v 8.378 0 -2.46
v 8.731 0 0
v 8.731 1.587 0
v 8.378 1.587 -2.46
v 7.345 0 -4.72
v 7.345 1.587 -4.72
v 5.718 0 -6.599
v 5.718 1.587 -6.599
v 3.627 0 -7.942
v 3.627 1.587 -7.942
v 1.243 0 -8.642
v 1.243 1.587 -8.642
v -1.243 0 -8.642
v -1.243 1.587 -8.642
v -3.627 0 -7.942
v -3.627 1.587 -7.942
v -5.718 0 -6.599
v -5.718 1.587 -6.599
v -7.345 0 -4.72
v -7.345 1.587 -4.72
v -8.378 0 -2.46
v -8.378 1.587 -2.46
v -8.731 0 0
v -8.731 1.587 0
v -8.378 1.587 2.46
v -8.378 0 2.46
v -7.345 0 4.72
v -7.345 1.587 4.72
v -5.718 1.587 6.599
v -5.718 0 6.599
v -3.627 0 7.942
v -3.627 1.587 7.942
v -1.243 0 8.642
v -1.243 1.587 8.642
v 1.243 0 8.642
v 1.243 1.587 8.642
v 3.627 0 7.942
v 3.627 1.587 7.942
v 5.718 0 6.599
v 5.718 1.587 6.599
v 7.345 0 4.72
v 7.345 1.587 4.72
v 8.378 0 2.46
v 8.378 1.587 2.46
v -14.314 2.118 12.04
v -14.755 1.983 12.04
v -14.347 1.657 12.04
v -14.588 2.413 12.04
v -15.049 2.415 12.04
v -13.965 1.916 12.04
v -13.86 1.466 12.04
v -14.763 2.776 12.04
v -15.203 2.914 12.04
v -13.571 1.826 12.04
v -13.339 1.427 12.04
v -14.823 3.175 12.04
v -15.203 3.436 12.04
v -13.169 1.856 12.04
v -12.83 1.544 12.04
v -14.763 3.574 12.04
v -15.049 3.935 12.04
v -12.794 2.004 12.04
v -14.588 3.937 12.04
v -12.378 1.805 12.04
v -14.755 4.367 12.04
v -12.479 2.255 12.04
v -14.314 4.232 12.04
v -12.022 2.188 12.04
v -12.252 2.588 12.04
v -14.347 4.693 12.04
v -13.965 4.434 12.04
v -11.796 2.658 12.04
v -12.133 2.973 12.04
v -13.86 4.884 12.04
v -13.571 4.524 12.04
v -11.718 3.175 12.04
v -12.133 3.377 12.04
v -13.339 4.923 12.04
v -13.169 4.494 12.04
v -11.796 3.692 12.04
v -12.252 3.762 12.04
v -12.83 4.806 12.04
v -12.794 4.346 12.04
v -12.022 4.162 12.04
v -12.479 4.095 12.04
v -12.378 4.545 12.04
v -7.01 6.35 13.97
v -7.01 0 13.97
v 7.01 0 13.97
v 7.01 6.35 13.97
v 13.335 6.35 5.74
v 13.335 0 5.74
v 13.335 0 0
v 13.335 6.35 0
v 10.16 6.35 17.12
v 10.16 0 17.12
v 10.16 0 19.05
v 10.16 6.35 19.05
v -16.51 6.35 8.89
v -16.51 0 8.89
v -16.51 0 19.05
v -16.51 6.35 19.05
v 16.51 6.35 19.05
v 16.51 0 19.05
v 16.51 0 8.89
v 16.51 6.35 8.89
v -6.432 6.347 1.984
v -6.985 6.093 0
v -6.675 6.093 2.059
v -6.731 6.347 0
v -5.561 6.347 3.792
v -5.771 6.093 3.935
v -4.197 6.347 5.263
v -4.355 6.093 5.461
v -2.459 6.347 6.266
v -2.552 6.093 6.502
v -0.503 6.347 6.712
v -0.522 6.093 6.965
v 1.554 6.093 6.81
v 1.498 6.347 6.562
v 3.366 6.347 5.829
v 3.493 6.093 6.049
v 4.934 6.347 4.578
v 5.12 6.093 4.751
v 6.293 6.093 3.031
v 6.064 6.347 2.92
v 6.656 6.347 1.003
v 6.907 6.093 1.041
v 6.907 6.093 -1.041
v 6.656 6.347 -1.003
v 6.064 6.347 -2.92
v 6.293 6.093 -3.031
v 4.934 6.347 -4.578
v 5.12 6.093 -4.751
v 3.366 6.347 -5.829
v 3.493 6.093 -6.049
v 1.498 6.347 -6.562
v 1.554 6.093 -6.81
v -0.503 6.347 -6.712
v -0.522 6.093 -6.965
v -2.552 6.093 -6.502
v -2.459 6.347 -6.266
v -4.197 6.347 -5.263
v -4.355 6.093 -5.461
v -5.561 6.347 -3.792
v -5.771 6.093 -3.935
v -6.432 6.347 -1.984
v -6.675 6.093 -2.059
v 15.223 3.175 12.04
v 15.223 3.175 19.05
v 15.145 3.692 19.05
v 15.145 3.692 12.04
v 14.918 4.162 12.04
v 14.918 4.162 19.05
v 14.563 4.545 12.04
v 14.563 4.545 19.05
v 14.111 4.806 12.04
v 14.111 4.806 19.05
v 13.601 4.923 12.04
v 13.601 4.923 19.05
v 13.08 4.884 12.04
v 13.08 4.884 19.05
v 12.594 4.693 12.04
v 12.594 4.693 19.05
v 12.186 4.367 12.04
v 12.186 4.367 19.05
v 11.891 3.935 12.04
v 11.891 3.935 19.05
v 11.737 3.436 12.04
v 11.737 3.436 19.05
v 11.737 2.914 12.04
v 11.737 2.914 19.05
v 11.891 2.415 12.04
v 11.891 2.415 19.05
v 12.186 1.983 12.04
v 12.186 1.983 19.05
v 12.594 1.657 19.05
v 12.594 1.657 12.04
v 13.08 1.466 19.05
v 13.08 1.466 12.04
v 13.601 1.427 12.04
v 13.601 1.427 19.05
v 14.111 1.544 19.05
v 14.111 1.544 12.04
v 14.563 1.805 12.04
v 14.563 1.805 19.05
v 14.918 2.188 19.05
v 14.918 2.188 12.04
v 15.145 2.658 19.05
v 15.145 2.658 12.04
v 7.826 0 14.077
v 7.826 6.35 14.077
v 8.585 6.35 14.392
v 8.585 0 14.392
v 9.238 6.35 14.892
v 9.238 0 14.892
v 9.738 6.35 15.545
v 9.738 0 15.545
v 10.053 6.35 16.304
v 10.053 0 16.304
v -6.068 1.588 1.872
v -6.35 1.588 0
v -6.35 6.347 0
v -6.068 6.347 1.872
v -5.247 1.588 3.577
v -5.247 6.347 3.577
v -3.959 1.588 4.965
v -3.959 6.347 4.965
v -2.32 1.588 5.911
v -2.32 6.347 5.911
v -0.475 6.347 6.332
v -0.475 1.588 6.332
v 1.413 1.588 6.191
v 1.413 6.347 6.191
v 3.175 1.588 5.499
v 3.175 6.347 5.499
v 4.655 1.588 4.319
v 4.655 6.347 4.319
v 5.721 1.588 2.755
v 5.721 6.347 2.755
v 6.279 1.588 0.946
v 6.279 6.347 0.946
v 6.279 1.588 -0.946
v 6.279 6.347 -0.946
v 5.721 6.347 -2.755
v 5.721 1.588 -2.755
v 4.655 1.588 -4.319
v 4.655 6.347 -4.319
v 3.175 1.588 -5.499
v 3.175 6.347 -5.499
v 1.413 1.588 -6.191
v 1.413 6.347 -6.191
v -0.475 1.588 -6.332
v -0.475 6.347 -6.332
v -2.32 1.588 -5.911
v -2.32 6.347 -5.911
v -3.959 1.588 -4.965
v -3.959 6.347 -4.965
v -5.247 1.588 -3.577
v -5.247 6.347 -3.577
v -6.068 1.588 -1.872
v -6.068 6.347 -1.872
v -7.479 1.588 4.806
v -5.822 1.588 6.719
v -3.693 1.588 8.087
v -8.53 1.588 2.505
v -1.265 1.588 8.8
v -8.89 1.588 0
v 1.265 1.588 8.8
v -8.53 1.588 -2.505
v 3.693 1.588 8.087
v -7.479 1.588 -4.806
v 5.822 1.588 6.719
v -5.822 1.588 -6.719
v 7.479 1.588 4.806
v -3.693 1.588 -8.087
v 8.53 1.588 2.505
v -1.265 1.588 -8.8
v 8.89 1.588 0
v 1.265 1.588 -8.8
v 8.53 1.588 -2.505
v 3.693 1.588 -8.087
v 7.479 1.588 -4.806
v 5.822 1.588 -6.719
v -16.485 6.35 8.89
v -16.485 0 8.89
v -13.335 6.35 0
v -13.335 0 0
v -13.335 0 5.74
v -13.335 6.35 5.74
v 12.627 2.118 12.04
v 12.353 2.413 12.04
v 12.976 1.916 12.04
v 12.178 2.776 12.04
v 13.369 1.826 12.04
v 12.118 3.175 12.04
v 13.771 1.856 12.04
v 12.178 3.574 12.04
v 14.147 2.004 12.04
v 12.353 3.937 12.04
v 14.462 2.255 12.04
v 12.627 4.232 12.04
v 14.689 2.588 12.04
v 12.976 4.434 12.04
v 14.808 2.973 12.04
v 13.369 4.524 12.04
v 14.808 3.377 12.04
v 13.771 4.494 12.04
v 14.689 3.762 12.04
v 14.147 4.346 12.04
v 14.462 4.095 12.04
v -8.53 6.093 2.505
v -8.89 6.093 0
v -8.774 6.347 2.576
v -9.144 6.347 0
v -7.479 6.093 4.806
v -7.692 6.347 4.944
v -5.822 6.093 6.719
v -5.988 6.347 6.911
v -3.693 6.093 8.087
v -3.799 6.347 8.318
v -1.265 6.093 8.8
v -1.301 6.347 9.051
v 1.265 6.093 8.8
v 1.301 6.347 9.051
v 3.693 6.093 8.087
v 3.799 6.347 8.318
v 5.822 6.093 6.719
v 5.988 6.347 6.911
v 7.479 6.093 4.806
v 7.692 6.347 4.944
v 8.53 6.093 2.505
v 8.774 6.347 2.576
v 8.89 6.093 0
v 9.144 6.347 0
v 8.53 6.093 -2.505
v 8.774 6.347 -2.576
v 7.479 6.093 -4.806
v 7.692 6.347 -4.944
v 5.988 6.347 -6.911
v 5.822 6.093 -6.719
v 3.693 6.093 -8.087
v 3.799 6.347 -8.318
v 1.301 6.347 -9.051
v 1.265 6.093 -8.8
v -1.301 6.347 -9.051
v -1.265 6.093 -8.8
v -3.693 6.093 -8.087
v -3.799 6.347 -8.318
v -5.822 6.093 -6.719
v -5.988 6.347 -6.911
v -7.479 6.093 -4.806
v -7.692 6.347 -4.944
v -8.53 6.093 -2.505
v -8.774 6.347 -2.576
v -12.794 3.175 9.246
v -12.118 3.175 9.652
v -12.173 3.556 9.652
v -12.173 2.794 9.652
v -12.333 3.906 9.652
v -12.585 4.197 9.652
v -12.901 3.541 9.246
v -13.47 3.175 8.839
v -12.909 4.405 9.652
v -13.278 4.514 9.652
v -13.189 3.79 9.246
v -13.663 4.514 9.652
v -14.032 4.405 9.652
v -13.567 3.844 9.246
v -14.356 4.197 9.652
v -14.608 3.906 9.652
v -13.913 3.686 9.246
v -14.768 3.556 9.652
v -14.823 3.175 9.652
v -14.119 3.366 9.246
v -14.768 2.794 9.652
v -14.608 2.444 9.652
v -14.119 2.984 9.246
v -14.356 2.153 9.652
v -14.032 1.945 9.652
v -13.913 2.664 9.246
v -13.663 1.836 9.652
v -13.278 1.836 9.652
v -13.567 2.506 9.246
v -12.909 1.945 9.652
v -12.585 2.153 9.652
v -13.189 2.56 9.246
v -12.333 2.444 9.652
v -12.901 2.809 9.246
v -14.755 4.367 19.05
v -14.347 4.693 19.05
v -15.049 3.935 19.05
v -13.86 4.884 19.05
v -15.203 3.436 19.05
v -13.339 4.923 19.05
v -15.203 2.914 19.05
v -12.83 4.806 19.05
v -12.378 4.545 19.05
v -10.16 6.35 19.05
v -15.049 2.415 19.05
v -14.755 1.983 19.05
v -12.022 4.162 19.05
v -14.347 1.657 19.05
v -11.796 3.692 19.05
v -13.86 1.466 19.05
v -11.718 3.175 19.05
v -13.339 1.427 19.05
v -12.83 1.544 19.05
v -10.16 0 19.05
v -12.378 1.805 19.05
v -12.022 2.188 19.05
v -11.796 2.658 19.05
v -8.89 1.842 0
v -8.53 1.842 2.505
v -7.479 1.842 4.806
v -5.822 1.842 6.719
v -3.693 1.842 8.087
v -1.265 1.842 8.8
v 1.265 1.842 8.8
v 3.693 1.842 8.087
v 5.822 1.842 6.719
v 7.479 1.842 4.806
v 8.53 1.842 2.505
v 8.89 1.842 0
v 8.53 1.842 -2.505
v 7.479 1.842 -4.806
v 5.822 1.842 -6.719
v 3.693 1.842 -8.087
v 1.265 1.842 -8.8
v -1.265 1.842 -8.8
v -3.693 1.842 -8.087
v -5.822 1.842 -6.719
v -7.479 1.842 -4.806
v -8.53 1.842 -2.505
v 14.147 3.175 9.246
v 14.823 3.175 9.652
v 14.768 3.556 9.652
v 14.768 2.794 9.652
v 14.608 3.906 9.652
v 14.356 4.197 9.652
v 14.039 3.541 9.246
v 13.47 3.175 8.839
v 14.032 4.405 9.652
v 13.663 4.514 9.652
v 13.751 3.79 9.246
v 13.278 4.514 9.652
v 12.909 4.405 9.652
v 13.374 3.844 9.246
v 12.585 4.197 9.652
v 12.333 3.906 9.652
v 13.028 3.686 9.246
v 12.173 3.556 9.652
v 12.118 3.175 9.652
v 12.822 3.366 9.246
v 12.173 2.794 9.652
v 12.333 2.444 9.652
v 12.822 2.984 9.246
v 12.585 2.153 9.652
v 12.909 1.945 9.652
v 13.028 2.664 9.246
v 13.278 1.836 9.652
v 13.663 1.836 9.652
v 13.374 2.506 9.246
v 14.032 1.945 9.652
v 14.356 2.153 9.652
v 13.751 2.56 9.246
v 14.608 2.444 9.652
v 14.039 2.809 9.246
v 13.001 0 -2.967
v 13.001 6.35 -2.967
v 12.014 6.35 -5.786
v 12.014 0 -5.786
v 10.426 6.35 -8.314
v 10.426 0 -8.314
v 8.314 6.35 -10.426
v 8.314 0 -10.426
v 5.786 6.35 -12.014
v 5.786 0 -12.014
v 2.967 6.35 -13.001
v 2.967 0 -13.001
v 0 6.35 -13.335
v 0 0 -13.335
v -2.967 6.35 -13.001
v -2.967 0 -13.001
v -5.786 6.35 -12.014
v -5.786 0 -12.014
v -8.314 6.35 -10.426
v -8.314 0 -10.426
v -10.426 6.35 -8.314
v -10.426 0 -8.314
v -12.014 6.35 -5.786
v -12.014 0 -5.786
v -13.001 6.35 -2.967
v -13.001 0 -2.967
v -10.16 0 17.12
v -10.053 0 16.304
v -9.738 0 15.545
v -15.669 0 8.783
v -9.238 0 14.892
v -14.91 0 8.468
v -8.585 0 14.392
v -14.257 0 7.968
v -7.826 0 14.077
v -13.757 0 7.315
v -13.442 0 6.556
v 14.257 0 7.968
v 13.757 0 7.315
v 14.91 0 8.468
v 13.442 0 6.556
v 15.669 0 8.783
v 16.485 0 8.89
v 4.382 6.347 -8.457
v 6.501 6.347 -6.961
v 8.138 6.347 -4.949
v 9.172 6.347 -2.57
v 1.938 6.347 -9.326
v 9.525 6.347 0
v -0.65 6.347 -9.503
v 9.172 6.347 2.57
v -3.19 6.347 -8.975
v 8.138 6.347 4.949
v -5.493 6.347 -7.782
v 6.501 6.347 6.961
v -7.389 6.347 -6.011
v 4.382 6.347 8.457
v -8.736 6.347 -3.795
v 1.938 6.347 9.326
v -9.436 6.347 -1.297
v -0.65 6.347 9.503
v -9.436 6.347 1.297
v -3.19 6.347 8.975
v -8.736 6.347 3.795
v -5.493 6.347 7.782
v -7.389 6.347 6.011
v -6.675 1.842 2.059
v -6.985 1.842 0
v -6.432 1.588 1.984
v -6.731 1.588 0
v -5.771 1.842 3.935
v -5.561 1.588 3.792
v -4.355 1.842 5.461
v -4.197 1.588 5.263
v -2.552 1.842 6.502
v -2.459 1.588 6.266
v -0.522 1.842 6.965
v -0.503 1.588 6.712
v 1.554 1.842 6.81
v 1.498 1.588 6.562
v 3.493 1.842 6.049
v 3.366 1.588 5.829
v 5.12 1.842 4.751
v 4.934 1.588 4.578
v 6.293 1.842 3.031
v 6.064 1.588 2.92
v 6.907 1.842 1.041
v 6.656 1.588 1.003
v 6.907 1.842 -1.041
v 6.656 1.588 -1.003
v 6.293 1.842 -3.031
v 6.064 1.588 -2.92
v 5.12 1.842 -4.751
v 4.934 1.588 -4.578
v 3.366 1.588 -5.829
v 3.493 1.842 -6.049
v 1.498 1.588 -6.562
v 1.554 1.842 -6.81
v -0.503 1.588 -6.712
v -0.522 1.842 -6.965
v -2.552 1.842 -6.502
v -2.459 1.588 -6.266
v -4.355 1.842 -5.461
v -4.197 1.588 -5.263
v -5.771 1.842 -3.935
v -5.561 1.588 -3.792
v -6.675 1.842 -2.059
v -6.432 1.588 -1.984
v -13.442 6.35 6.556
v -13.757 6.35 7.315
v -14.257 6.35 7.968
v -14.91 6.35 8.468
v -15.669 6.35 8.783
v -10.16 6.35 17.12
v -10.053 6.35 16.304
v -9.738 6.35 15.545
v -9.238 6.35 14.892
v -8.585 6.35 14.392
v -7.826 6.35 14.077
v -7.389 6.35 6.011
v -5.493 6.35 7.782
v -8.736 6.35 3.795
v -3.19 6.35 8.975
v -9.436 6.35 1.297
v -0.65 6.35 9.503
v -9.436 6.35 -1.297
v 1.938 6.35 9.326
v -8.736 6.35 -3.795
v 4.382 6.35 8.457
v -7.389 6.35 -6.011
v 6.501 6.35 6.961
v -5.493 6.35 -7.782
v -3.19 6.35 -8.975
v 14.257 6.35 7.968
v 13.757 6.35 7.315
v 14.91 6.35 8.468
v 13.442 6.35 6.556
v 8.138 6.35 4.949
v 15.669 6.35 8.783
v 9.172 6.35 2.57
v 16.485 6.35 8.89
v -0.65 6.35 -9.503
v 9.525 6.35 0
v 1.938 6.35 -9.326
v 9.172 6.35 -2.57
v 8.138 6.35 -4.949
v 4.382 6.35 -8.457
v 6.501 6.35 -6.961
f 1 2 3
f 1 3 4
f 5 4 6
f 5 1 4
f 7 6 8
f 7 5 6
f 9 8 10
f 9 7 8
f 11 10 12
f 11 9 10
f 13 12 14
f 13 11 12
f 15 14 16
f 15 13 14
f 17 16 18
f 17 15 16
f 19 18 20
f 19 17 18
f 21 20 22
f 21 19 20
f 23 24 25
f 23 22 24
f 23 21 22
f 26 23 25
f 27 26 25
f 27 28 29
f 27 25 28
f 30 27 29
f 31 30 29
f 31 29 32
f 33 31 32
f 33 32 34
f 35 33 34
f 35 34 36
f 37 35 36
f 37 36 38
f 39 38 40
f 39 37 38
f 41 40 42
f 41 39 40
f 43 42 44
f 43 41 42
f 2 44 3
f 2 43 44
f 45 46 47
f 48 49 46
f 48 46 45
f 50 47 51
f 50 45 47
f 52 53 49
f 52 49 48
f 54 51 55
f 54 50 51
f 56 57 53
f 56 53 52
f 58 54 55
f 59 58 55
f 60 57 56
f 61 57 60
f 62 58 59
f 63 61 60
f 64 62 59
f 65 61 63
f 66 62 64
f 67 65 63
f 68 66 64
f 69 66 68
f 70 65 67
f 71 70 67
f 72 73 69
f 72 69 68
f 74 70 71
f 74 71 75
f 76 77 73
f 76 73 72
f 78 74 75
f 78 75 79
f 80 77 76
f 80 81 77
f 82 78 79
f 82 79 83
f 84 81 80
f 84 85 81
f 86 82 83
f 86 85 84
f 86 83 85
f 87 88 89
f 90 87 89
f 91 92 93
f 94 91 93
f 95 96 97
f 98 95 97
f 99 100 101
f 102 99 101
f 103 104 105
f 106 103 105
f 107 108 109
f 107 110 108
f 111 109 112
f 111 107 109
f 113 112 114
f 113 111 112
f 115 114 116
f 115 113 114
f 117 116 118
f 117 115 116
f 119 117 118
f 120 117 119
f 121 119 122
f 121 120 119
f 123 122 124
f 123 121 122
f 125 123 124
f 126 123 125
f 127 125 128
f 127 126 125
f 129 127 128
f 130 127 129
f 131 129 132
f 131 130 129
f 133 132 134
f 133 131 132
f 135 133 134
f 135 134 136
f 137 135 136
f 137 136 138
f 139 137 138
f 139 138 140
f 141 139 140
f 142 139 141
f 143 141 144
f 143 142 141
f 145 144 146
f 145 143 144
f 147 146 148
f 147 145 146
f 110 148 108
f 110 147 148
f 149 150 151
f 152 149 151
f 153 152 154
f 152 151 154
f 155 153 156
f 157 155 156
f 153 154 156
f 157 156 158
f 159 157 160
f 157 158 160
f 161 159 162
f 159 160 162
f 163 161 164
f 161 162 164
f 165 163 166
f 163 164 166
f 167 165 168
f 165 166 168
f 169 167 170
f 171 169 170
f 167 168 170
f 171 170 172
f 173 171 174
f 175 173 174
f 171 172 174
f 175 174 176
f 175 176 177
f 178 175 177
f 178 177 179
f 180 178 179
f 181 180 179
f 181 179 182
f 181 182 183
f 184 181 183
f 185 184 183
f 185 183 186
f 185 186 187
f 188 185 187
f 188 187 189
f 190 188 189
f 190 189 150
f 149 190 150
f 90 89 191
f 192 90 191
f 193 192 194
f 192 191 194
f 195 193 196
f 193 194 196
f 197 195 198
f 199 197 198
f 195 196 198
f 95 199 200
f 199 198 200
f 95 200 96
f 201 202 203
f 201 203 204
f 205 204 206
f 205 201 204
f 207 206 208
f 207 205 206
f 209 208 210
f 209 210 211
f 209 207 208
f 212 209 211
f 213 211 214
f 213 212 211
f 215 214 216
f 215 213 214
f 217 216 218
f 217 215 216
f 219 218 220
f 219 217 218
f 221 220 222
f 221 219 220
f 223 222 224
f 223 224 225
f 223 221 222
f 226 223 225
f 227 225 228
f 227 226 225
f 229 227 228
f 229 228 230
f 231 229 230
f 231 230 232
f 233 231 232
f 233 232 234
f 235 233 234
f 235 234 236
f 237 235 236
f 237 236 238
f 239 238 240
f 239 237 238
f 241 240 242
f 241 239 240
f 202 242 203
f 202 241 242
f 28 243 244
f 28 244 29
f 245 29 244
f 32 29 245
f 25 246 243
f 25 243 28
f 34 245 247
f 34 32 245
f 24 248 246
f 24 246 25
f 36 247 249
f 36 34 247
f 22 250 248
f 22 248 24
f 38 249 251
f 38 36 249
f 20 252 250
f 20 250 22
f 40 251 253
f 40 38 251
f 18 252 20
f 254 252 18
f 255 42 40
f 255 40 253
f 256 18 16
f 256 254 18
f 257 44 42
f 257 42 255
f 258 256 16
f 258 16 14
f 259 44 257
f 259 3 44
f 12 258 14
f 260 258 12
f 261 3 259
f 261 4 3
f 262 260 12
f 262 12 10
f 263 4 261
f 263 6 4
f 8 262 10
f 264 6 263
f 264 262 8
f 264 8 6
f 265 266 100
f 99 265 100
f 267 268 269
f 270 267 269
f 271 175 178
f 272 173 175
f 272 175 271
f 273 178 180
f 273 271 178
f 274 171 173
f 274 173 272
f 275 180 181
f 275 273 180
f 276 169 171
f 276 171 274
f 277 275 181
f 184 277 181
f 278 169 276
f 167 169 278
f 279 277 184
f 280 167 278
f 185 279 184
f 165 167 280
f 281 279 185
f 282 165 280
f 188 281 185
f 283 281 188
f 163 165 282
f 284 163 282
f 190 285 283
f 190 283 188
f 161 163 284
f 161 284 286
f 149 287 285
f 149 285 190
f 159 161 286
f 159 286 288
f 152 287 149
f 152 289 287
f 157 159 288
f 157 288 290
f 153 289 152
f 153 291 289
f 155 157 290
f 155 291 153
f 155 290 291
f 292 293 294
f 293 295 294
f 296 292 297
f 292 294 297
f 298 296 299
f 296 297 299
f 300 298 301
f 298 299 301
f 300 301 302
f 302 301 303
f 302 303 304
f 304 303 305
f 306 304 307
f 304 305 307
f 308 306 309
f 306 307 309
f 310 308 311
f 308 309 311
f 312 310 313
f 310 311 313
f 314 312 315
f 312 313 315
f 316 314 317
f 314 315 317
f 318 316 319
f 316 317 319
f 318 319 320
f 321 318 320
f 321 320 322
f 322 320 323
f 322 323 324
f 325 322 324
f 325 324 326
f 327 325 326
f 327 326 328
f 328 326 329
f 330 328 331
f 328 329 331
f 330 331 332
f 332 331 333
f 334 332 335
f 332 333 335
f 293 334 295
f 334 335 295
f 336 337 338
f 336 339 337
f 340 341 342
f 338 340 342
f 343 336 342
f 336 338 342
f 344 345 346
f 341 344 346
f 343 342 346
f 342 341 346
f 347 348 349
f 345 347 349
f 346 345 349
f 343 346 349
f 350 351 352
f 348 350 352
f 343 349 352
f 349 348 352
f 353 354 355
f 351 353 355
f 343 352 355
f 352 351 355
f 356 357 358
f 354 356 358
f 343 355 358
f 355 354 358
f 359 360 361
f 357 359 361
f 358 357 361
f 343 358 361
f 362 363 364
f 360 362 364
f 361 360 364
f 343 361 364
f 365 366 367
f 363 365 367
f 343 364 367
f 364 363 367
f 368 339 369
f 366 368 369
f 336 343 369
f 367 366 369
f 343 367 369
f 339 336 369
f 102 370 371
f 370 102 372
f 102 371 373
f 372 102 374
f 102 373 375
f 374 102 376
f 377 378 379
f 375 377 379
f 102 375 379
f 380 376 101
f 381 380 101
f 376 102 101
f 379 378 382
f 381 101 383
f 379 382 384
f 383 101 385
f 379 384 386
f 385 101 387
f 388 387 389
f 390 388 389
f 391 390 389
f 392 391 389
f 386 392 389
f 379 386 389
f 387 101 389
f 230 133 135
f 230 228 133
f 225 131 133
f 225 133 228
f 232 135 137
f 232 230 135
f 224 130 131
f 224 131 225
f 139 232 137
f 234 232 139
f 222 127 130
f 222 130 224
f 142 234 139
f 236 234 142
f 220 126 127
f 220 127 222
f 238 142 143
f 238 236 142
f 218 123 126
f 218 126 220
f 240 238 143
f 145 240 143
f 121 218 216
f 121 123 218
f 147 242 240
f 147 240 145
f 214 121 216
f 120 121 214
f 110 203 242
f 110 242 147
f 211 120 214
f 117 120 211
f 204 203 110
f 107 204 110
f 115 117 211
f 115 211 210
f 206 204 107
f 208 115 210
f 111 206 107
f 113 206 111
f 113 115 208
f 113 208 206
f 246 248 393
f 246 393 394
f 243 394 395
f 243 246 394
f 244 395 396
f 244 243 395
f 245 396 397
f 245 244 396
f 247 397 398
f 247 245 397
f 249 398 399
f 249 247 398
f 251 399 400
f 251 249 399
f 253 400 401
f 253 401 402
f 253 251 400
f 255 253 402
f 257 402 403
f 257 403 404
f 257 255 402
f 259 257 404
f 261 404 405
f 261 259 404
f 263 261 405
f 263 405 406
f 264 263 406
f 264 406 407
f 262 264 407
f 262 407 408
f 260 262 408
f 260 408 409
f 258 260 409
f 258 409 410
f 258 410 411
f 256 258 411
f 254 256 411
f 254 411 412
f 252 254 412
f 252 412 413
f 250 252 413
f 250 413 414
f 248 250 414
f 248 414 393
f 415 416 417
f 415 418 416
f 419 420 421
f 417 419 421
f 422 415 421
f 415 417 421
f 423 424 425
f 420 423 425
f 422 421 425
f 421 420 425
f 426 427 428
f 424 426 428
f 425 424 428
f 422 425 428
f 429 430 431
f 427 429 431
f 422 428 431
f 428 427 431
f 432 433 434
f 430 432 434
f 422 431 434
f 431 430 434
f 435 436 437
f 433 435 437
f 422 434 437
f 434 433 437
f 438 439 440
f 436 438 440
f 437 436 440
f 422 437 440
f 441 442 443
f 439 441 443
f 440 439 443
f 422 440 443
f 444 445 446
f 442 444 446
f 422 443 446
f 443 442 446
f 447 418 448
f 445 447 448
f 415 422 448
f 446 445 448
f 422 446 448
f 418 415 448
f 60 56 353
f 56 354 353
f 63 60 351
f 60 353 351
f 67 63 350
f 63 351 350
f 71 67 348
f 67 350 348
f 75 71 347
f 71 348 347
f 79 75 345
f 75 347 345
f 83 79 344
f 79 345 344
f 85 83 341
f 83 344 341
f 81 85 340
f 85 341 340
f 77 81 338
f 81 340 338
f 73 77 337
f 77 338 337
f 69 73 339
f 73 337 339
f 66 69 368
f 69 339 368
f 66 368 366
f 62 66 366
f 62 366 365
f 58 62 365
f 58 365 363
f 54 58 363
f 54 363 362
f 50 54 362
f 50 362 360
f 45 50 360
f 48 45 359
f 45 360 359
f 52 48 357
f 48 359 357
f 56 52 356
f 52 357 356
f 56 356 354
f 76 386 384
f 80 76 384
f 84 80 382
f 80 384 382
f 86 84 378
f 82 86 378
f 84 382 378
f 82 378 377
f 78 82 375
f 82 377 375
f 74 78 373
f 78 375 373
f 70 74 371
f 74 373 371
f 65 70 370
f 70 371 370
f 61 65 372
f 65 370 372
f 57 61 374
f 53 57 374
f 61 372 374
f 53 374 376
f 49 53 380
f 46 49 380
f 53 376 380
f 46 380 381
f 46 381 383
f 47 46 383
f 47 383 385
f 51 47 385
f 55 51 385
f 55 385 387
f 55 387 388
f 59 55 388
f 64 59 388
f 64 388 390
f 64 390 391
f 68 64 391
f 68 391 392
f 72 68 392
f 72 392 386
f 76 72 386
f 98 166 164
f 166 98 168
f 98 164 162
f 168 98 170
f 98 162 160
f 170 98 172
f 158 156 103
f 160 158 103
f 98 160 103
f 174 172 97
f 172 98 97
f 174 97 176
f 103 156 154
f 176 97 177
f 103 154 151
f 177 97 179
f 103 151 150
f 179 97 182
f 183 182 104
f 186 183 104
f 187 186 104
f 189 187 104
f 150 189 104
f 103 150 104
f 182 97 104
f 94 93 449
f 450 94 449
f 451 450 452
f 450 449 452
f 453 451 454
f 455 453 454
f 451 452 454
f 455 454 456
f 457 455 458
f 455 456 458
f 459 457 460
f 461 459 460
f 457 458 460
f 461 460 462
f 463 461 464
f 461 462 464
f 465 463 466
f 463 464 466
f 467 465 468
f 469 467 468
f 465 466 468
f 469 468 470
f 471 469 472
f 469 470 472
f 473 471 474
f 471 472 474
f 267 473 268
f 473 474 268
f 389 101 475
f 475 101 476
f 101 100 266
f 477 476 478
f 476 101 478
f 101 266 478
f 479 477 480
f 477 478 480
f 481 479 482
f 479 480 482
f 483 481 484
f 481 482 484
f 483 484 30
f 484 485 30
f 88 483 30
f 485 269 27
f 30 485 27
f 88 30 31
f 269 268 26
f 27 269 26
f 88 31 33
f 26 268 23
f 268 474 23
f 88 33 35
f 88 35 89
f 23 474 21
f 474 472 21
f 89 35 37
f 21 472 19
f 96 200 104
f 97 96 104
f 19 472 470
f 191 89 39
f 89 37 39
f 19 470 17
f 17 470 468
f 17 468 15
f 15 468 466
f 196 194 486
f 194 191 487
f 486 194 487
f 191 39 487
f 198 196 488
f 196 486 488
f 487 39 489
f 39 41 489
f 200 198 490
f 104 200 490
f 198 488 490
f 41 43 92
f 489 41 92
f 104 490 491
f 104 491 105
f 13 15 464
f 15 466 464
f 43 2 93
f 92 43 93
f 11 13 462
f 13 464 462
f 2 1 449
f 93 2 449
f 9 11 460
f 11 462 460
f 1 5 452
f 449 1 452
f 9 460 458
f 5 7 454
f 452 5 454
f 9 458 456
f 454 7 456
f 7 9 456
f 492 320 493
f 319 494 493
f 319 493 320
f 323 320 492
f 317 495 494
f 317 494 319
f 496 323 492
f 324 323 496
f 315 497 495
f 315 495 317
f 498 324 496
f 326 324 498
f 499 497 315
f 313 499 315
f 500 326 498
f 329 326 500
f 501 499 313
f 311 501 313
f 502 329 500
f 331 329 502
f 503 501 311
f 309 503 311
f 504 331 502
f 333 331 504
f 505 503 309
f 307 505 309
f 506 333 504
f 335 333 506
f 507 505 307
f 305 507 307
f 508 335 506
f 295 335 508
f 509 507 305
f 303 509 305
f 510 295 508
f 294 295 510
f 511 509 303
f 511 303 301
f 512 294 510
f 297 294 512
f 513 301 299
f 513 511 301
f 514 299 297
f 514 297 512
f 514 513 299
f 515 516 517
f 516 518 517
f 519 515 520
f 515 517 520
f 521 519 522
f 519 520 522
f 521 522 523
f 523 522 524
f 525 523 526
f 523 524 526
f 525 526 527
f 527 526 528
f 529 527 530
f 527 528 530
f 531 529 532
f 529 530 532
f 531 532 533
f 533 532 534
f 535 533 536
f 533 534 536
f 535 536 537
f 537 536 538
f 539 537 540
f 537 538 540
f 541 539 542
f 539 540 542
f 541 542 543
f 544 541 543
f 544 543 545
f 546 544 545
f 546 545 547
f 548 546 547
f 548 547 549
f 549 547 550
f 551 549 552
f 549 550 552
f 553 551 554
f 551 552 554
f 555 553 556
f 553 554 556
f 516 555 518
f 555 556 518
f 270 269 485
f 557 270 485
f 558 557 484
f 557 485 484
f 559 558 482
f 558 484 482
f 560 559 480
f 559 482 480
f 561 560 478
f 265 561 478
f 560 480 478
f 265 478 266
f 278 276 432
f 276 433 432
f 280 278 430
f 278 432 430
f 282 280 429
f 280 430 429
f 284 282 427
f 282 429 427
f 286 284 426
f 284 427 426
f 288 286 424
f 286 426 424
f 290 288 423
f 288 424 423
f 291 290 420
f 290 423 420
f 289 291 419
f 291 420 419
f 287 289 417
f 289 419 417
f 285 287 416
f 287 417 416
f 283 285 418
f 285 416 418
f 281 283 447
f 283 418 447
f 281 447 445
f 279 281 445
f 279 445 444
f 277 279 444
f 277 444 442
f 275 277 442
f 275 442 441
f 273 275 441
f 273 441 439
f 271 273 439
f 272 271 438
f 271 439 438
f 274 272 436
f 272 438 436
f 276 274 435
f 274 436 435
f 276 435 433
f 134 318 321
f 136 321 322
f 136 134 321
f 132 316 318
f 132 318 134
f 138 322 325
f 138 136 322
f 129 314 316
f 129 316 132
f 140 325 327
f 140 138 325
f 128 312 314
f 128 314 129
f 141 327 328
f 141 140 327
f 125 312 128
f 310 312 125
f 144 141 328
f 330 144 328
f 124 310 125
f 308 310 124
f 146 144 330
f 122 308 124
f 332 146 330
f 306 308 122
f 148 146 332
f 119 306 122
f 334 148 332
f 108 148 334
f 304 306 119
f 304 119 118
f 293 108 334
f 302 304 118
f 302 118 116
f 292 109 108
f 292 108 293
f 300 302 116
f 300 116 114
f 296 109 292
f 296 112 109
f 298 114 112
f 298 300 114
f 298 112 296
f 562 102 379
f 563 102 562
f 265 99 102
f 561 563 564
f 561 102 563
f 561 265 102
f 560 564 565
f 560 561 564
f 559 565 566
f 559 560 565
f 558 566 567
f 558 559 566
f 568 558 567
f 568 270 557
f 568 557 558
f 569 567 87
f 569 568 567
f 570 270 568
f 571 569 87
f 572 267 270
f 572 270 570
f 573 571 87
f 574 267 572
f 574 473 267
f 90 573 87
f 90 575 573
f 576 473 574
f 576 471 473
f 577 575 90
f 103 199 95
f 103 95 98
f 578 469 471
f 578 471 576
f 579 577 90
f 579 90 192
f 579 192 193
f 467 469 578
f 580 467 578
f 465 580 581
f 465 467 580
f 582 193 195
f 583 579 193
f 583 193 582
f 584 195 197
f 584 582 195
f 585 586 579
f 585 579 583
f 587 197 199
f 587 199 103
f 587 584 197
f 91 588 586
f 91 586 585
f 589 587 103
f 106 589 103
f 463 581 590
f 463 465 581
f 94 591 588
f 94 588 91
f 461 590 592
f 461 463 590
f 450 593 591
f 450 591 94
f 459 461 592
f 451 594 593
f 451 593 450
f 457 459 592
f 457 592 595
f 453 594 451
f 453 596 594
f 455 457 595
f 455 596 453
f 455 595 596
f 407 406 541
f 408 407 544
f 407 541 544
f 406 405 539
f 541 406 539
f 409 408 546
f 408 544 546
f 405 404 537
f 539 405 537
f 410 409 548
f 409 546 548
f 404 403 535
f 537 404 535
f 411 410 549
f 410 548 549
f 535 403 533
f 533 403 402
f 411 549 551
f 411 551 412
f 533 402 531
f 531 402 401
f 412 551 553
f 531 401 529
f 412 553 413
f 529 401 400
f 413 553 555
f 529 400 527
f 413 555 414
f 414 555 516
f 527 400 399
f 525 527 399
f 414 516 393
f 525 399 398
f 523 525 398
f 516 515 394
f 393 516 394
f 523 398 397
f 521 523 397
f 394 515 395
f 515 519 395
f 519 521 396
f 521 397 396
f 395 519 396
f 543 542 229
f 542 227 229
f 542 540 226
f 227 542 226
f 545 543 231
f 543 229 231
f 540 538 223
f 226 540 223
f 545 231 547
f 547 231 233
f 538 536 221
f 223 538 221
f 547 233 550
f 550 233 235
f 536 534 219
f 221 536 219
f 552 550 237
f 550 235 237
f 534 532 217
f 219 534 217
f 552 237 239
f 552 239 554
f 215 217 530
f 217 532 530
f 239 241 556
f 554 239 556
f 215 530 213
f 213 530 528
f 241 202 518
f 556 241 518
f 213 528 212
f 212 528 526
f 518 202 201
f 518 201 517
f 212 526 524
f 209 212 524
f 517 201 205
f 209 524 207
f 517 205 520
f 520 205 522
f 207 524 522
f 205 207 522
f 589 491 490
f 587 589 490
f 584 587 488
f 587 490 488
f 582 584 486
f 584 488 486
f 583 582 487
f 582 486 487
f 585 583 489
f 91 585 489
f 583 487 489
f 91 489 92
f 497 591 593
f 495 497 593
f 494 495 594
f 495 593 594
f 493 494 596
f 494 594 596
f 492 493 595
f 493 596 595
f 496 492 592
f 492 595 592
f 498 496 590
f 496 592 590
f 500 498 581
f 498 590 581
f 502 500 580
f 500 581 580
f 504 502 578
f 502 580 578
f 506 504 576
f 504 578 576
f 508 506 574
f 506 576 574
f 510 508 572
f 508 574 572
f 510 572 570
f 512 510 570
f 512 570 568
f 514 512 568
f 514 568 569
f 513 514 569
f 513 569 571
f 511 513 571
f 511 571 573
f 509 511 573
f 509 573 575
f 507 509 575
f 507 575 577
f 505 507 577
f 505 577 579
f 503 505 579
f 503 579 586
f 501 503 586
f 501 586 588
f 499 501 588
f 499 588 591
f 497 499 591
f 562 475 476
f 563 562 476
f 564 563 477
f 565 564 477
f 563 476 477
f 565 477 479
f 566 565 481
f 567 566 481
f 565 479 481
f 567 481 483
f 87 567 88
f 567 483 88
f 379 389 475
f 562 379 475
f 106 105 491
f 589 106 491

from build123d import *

# Parameters (mm, degrees)
SKETCH1_R                       = 8.73125
BOSS_EXTRUDE1_DEPTH             = 6.35
SKETCH2_R                       = 9.525
CUT_EXTRUDE1_DEPTH              = 4.7625
SKETCH3_R                       = 9.525
SKETCH3_R_2                     = 8.89
BOSS_EXTRUDE2_DEPTH             = 4.75996
CHAMFER1_SIZE                   = 0.254
SKETCH5_R                       = 6.985
SKETCH5_R_2                     = 6.35
BOSS_EXTRUDE3_DEPTH             = 4.75996
CHAMFER2_SIZE                   = 0.254
SKETCH6_R                       = 8.89
SKETCH6_R_2                     = 6.985
BOSS_EXTRUDE4_DEPTH             = 4.25196
F_6_32_TAPPED_HOLE1_D           = 2.7051
F_6_32_TAPPED_HOLE1_DEPTH       = 9.398
F_6_32_TAPPED_HOLE1_CBORE_D     = 3.5052
F_6_32_TAPPED_HOLE1_CBORE_DEPTH = 7.0104
F_6_32_TAPPED_HOLE1_TIP         = 0.81269403


with BuildPart() as part:
    # Sketch1 → Boss-Extrude1 (new body)
    with BuildSketch(Plane(origin=(0, 0, 0), x_dir=(1, 0, 0), z_dir=(0, 1, 0))):
        with BuildLine():
            Line((-13.335, 0), (-13.335, -5.7404))
            ThreePointArc((-13.335, -5.7404), (-14.257496482, -7.967503518), (-16.4846, -8.89))
            Line((-16.4846, -8.89), (-16.51, -8.89))
            Line((-16.51, -8.89), (-16.51, -19.05))
            Line((-16.51, -19.05), (-10.16, -19.05))
            Line((-10.16, -19.05), (-10.16, -17.1196))
            ThreePointArc((-10.16, -17.1196), (-9.237503518, -14.892496482), (-7.0104, -13.97))
            Line((-7.0104, -13.97), (7.0104, -13.97))
            ThreePointArc((7.0104, -13.97), (9.237503518, -14.892496482), (10.16, -17.1196))
            Line((10.16, -17.1196), (10.16, -19.05))
            Line((10.16, -19.05), (16.51, -19.05))
            Line((16.51, -19.05), (16.51, -8.89))
            Line((16.51, -8.89), (16.4846, -8.89))
            ThreePointArc((16.4846, -8.89), (14.257496482, -7.967503518), (13.335, -5.7404))
            Line((13.335, -5.7404), (13.335, 0))
            ThreePointArc((13.335, 0), (0, 13.335), (-13.335, 0))
        make_face()
        Circle(SKETCH1_R, mode=Mode.SUBTRACT)
    extrude(amount=BOSS_EXTRUDE1_DEPTH)

    # Sketch2 → Cut-Extrude1 (cut)
    with BuildSketch(Plane(origin=(0, 6.35, 0), x_dir=(1, 0, 0), z_dir=(0, 1, 0))):
        Circle(SKETCH2_R)
    extrude(amount=-CUT_EXTRUDE1_DEPTH, mode=Mode.SUBTRACT)

    # Sketch3 → Boss-Extrude2 (add)
    with BuildSketch(Plane(origin=(0, 1.5875, 0), x_dir=(-1, 0, 0), z_dir=(0, 1, 0))):
        Circle(SKETCH3_R)
        Circle(SKETCH3_R_2, mode=Mode.SUBTRACT)
    extrude(amount=BOSS_EXTRUDE2_DEPTH)

    # Chamfer1
    chamfer1_edges = [part.edges().sort_by_distance(p)[0] for p in [
        (8.89, 6.34746, 0),
    ]]
    chamfer(chamfer1_edges, length=CHAMFER1_SIZE)



with BuildPart() as body_2:
    # Sketch5 → Boss-Extrude3 (new body)
    with BuildSketch(Plane(origin=(0, 1.5875, 0), x_dir=(-1, 0, 0), z_dir=(0, 1, 0))):
        Circle(SKETCH5_R)
        Circle(SKETCH5_R_2, mode=Mode.SUBTRACT)
    extrude(amount=BOSS_EXTRUDE3_DEPTH)

    # Chamfer2
    chamfer2_edges = [body_2.edges().sort_by_distance(p)[0] for p in [
        (6.985, 1.5875, 0),
        (6.985, 6.34746, 0),
    ]]
    chamfer(chamfer2_edges, length=CHAMFER2_SIZE)


with BuildPart() as part_1:
    add(part.part)

    add(body_2.part)  # Boss-Extrude4 merges body 2
    # Sketch6 → Boss-Extrude4 (add)
    with BuildSketch(Plane(origin=(0, 6.09346, 0), x_dir=(-1, 0, 0), z_dir=(0, 1, 0))):
        Circle(SKETCH6_R)
        Circle(SKETCH6_R_2, mode=Mode.SUBTRACT)
    extrude(amount=-BOSS_EXTRUDE4_DEPTH)

    # #6-32 Tapped Hole1
    with Locations(Plane.XY.offset(19.05)):
        with Locations((-13.470384182, 3.175), (13.470384182, 3.175)):
            CounterBoreHole(F_6_32_TAPPED_HOLE1_D / 2, F_6_32_TAPPED_HOLE1_CBORE_D / 2, F_6_32_TAPPED_HOLE1_CBORE_DEPTH, depth=F_6_32_TAPPED_HOLE1_DEPTH)
            with Locations((0, 0, -(F_6_32_TAPPED_HOLE1_DEPTH + F_6_32_TAPPED_HOLE1_TIP / 2))):  # 118° drill point
                Cone(0, F_6_32_TAPPED_HOLE1_D / 2, F_6_32_TAPPED_HOLE1_TIP, mode=Mode.SUBTRACT)


solid = part_1.part
